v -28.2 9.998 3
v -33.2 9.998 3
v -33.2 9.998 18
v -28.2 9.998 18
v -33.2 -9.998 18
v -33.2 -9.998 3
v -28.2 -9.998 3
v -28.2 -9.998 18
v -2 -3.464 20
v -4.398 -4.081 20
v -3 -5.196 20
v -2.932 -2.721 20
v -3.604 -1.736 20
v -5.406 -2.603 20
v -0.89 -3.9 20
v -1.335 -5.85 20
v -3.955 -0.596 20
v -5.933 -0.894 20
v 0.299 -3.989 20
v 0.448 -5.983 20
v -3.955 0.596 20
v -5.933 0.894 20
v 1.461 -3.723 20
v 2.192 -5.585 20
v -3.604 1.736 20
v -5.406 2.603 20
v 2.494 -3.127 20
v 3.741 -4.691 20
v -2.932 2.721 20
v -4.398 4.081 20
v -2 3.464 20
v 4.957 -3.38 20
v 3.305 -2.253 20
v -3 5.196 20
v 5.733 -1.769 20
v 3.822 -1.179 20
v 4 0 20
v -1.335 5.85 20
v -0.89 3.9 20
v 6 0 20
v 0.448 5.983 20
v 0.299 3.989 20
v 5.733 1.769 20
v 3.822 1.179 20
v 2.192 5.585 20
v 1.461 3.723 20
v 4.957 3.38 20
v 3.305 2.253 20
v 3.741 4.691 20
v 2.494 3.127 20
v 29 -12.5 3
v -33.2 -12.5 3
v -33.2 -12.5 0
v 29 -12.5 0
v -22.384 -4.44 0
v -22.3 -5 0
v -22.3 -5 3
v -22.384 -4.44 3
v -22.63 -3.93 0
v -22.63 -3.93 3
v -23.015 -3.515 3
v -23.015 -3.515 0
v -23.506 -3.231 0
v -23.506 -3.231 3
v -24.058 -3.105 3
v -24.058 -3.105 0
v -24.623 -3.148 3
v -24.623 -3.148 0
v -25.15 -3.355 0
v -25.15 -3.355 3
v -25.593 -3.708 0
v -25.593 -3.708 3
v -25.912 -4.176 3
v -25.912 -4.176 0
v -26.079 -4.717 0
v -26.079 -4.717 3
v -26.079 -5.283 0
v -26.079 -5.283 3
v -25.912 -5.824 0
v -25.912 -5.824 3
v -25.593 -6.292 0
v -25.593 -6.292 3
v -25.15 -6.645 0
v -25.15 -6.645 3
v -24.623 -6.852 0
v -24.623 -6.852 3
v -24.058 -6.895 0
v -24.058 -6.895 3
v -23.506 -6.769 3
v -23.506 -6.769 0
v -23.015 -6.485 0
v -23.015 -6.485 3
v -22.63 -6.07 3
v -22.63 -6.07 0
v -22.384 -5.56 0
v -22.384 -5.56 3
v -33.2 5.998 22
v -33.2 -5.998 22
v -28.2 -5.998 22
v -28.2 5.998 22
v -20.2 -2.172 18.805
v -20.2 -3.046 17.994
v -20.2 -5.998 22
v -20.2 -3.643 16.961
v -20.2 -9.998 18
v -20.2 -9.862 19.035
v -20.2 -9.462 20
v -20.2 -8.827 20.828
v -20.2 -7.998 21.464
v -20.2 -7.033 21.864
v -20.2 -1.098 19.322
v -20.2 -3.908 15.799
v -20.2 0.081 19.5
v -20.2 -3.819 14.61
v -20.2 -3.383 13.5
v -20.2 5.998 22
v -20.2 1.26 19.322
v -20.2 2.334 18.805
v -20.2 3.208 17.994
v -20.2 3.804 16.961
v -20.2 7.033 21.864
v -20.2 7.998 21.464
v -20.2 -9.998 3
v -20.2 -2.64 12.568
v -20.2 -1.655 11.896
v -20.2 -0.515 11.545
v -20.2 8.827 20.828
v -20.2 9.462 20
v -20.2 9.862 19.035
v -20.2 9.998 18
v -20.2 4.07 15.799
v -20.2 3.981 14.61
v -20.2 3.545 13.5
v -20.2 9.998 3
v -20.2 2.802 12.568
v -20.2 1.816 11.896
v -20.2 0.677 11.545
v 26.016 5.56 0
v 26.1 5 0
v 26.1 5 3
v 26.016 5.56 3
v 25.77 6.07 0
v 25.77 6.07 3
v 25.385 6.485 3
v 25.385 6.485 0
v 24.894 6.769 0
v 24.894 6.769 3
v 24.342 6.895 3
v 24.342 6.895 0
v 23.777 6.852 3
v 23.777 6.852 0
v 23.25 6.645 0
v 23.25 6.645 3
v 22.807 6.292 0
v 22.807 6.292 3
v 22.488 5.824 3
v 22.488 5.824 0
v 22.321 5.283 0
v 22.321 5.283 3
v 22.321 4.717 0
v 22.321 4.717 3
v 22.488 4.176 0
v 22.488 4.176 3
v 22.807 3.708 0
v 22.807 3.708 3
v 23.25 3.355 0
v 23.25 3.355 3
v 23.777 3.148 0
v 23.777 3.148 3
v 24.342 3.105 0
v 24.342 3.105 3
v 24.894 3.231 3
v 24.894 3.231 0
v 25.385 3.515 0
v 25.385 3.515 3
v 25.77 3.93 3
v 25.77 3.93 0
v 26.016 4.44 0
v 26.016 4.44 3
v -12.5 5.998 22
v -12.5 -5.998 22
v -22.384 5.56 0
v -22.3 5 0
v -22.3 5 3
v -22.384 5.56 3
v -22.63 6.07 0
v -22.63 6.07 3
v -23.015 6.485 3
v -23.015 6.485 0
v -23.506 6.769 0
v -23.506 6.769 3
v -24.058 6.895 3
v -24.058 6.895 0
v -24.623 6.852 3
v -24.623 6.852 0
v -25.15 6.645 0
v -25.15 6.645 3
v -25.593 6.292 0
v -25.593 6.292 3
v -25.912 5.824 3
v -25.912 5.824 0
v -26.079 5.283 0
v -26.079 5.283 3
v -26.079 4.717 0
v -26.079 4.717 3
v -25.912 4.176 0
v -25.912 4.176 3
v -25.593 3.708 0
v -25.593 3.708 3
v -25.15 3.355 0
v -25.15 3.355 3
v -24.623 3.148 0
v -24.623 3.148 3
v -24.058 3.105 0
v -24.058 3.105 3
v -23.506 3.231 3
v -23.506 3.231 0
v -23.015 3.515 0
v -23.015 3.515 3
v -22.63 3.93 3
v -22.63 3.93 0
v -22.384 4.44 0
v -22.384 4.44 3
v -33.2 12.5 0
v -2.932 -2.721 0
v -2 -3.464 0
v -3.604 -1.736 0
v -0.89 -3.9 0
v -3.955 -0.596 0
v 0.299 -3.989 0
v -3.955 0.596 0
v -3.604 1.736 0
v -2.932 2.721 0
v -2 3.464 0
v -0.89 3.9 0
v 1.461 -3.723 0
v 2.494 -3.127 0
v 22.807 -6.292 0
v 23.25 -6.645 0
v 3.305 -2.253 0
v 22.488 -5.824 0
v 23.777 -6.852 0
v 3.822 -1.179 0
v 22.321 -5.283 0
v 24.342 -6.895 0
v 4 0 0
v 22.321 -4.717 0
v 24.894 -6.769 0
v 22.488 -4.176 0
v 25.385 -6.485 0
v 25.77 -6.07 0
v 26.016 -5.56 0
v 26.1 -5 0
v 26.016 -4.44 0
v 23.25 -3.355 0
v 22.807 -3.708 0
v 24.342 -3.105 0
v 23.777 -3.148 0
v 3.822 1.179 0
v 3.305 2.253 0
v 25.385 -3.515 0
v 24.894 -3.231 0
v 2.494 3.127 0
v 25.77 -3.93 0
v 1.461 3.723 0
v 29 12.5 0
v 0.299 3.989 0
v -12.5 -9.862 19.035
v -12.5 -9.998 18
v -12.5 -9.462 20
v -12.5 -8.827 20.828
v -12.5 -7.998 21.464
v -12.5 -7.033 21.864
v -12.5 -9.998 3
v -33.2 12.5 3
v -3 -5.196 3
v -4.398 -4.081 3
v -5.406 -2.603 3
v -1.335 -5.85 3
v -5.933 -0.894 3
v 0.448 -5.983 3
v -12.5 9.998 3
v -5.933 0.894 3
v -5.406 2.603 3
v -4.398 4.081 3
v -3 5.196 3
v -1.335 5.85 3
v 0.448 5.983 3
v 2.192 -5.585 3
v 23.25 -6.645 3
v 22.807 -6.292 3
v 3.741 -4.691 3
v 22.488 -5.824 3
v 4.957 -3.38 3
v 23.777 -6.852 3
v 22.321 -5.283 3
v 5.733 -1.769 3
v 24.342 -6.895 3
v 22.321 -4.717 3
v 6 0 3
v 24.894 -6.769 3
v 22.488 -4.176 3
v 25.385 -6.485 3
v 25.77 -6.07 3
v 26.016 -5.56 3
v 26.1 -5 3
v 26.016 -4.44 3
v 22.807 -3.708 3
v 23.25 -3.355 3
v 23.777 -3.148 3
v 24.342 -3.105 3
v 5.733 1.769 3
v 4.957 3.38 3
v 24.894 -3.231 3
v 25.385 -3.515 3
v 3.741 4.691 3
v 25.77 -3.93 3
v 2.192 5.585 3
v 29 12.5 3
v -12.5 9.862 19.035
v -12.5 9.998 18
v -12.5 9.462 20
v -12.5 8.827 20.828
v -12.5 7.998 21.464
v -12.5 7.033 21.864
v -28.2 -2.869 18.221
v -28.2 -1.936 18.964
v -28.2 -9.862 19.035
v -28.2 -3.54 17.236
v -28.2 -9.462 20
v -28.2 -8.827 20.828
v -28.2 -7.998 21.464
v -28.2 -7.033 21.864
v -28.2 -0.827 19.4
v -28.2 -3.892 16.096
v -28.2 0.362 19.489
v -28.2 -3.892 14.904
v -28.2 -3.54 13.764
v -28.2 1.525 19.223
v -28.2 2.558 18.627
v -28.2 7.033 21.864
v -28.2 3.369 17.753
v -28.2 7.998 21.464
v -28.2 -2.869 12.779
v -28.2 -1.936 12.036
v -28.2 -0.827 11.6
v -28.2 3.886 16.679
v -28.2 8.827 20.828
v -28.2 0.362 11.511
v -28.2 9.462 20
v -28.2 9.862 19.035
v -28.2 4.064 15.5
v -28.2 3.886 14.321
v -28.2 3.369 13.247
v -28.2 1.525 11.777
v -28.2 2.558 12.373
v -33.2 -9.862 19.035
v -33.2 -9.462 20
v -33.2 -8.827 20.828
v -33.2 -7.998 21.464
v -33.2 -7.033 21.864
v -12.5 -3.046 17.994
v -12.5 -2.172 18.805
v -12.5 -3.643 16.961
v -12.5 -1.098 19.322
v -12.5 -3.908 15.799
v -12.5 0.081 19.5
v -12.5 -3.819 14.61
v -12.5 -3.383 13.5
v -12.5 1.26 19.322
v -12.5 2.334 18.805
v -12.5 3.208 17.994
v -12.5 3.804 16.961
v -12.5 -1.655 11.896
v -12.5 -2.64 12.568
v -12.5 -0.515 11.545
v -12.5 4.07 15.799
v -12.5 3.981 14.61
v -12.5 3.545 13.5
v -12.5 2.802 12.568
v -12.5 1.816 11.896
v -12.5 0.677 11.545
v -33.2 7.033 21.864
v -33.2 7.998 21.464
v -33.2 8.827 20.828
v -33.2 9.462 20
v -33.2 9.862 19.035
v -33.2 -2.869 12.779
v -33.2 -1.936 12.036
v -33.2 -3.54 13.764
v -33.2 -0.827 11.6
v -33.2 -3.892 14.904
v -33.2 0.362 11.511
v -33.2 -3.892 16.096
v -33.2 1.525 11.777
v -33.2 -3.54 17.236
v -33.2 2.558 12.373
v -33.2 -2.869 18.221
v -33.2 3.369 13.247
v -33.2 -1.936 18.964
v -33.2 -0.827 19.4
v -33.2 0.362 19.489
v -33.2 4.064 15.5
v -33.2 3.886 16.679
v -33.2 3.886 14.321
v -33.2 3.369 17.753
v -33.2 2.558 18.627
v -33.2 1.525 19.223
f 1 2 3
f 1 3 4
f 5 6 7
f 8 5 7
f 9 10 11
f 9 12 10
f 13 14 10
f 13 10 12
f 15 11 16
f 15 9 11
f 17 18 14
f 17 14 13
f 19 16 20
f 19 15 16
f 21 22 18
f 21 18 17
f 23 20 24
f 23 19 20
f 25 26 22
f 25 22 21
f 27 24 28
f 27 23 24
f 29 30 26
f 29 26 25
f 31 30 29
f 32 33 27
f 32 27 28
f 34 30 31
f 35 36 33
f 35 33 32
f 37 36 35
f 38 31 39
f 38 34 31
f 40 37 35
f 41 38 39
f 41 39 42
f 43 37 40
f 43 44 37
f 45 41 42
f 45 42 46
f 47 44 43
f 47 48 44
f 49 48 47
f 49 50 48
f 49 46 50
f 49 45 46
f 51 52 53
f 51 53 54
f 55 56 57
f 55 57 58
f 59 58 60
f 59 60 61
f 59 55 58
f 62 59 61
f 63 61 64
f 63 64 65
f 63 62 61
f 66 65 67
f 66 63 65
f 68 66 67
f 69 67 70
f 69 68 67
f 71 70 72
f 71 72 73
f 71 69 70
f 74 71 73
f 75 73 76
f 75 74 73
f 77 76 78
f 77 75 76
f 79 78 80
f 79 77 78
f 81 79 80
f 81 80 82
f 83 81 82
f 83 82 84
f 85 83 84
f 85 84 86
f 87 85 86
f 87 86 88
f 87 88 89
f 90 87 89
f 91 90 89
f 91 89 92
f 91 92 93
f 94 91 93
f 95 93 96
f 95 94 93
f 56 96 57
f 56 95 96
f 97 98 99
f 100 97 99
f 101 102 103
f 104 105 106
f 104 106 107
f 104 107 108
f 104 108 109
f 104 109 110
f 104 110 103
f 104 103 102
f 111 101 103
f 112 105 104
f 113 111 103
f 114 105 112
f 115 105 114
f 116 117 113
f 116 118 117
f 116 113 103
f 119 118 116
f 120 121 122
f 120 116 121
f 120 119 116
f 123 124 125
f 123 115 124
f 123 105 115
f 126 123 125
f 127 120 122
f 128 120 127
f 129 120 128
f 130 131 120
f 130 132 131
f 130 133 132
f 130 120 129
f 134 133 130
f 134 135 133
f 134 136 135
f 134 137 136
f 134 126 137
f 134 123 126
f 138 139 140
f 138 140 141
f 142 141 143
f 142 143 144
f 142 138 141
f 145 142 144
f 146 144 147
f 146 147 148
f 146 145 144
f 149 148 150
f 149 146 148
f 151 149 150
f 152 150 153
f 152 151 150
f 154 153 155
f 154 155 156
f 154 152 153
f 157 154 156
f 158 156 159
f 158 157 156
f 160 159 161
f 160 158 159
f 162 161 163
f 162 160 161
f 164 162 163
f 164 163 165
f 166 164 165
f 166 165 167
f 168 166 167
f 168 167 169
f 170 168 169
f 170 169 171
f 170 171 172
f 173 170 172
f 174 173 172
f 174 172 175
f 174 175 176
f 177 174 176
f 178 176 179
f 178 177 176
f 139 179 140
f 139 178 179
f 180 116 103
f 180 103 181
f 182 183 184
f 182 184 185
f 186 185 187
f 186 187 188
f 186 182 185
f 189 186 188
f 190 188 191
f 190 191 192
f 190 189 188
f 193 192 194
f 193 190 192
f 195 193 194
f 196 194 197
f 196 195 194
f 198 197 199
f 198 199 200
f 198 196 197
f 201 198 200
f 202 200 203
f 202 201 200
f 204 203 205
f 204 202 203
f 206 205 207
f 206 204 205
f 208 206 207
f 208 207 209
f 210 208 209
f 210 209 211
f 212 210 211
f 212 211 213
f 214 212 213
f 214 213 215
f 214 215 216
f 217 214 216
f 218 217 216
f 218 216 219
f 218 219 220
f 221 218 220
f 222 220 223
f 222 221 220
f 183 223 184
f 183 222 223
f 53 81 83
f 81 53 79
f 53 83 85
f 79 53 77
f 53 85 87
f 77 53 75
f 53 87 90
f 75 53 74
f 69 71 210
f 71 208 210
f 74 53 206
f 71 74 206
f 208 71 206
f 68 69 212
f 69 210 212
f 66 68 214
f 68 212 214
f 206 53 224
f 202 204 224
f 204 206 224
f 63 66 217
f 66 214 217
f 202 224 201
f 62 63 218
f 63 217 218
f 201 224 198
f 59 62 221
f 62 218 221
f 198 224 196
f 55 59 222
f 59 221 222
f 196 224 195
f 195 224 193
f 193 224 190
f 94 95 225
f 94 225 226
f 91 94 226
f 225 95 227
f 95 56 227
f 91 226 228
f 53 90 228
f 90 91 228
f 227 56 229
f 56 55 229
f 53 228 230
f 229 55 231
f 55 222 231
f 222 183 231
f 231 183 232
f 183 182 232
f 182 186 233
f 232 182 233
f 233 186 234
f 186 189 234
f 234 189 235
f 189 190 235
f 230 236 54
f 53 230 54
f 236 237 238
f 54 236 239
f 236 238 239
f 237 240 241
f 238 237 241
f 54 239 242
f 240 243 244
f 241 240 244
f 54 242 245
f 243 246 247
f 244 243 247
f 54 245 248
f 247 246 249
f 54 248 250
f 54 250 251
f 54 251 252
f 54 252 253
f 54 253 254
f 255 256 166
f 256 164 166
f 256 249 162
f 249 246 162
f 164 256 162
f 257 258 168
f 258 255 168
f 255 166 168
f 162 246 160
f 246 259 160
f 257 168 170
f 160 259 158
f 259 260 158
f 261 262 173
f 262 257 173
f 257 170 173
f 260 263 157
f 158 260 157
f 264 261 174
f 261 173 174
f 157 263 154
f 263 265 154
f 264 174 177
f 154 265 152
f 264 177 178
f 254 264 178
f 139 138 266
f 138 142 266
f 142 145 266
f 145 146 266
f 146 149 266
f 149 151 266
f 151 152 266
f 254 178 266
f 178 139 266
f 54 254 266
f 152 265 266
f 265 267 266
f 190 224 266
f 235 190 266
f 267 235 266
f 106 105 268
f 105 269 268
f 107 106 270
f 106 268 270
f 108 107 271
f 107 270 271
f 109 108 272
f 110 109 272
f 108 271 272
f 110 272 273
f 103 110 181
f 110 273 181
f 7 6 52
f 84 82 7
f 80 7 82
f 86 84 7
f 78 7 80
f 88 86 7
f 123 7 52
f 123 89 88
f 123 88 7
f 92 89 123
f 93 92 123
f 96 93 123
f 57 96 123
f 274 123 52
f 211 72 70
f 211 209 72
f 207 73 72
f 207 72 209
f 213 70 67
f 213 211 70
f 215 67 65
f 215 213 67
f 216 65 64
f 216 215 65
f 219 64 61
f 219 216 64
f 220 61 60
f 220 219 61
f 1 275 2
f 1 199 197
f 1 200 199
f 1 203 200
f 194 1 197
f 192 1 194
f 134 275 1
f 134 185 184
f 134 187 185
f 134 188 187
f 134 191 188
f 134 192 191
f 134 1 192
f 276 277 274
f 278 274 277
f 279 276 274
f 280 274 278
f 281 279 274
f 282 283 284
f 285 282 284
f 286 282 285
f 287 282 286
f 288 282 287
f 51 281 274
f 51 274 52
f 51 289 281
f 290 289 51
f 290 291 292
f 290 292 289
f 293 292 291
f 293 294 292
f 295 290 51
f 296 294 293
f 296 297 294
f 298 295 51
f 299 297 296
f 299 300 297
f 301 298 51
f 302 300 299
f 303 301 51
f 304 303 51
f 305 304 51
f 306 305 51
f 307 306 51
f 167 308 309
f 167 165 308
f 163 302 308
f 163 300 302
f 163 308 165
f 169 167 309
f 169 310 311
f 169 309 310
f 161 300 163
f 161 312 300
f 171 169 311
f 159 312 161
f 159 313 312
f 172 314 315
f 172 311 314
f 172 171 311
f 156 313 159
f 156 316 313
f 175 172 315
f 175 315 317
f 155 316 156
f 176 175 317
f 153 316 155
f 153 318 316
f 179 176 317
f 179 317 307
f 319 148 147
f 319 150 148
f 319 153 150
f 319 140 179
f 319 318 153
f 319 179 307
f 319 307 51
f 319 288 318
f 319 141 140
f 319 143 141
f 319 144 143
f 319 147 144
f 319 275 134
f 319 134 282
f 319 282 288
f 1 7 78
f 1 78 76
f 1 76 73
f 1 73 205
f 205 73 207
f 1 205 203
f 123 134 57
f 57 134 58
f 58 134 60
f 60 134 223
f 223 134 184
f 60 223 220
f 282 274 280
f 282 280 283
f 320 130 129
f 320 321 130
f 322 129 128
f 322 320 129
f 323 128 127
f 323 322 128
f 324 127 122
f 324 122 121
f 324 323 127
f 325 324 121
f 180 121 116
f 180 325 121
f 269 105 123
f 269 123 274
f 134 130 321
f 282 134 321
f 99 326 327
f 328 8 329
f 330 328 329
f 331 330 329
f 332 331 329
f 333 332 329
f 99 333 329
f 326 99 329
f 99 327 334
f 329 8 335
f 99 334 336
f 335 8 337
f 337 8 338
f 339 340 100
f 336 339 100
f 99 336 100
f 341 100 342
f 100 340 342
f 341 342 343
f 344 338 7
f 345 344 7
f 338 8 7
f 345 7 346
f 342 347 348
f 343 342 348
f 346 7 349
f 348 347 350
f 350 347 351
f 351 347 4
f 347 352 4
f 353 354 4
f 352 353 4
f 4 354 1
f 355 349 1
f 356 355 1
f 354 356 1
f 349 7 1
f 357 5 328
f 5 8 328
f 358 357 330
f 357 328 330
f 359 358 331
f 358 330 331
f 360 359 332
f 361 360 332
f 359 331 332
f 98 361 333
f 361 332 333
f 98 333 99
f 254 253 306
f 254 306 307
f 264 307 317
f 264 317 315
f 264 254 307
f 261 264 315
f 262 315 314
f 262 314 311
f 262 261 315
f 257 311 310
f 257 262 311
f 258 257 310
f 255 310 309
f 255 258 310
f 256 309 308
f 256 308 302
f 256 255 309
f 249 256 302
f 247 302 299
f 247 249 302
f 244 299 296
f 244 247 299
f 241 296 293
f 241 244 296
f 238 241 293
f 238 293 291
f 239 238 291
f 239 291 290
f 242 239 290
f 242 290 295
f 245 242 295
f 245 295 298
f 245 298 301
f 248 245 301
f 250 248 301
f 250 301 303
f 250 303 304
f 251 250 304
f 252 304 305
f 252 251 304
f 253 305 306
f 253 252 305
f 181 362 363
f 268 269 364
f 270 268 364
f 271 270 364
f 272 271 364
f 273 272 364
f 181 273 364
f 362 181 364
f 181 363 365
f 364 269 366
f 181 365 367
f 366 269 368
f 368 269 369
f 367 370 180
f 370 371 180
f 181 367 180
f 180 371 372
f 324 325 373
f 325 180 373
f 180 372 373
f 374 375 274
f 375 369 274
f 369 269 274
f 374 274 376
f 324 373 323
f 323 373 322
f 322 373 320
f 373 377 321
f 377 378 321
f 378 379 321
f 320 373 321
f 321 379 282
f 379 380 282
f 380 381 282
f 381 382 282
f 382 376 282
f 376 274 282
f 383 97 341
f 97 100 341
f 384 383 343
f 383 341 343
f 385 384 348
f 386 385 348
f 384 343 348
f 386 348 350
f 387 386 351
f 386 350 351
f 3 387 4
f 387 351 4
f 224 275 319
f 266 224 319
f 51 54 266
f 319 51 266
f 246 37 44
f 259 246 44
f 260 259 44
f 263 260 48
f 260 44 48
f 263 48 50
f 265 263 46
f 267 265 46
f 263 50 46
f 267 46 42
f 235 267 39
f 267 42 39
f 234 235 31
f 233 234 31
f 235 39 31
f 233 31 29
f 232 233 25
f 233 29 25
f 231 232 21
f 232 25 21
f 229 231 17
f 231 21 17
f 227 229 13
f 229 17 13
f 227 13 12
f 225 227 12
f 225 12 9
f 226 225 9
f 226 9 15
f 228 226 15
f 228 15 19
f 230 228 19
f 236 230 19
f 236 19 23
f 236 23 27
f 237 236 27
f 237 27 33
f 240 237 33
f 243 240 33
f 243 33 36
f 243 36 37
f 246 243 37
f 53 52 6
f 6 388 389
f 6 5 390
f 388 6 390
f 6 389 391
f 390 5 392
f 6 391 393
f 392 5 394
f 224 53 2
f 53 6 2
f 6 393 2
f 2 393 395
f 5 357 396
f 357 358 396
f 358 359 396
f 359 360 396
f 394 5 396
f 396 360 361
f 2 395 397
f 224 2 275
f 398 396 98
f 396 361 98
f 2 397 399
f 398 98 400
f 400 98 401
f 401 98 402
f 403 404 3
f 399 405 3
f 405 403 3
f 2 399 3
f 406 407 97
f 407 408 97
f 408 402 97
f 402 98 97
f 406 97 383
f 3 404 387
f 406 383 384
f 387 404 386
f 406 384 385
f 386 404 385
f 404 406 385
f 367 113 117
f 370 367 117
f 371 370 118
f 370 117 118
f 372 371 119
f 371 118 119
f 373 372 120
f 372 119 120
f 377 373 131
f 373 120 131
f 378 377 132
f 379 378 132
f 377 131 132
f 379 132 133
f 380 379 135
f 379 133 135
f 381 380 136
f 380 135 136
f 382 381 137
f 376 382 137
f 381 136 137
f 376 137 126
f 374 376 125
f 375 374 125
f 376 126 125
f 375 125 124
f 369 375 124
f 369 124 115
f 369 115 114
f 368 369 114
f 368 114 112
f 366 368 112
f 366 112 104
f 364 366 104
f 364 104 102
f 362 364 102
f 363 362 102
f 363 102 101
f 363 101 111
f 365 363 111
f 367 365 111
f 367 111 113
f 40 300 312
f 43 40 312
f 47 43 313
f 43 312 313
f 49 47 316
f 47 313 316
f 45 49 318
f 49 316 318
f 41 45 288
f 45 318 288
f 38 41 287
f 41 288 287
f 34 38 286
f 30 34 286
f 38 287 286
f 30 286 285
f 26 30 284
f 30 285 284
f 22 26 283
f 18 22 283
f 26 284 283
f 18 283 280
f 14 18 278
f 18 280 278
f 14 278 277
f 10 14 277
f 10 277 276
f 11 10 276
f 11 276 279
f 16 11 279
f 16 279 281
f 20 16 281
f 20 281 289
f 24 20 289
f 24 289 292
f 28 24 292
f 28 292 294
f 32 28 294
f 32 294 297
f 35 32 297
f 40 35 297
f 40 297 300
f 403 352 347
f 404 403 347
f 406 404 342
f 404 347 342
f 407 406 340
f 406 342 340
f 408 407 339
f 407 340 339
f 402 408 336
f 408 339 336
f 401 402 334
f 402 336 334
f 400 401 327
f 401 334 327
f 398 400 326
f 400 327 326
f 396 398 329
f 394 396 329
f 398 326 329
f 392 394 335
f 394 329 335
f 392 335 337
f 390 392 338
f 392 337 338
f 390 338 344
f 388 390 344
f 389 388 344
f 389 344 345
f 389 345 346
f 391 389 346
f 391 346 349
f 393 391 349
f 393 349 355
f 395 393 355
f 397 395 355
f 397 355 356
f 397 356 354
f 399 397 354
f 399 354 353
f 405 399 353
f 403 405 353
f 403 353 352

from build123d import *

# Parameters (mm, degrees)
SKETCH1_W           = 58
SKETCH1_H           = 25
SKETCH1_R           = 1.9
BOSS_EXTRUDE1_DEPTH = 3
SKETCH2_R           = 6
BOSS_EXTRUDE2_DEPTH = 20
SKETCH3_R           = 4
CUT_EXTRUDE1_DEPTH  = 38.379807383
SKETCH4_W           = 7.7
SKETCH4_H           = 19.996282454
BOSS_EXTRUDE3_DEPTH = 19
CUT_EXTRUDE2_REACH  = 57.325
SKETCH5_R           = 4
FILLET1_R           = 4
SKETCH7_W           = 4.2
SKETCH7_H           = 25
BOSS_EXTRUDE4_DEPTH = 3
SKETCH8_W           = 5
SKETCH8_H           = 19.996282454
BOSS_EXTRUDE5_DEPTH = 19
CUT_EXTRUDE3_REACH  = 64.547
SKETCH9_R           = 4
FILLET2_R           = 4


with BuildPart() as part:
    # Sketch1 → Boss-Extrude1 (new body)
    with BuildSketch(Plane.XY):
        Rectangle(SKETCH1_W, SKETCH1_H)
        with Locations((24.2, 5)):
            Circle(SKETCH1_R, mode=Mode.SUBTRACT)
        with Locations((24.2, -5)):
            Circle(SKETCH1_R, mode=Mode.SUBTRACT)
        with Locations((-24.2, 5)):
            Circle(SKETCH1_R, mode=Mode.SUBTRACT)
        with Locations((-24.2, -5)):
            Circle(SKETCH1_R, mode=Mode.SUBTRACT)
    extrude(amount=BOSS_EXTRUDE1_DEPTH)

    # Sketch2 → Boss-Extrude2 (add)
    with BuildSketch(Plane.XY):
        Circle(SKETCH2_R)
    extrude(amount=BOSS_EXTRUDE2_DEPTH)

    # Sketch3 → Cut-Extrude1 (cut, through all)
    with BuildSketch(Plane.XY.offset(20)):
        Circle(SKETCH3_R)
    extrude(amount=-CUT_EXTRUDE1_DEPTH, mode=Mode.SUBTRACT)

    # Sketch4 → Boss-Extrude3 (add)
    with BuildSketch(Plane.XY.offset(3)):
        with Locations((-16.35, 0)):
            Rectangle(SKETCH4_W, SKETCH4_H)
    extrude(amount=BOSS_EXTRUDE3_DEPTH)

    # Sketch5 → Cut-Extrude2 (cut, up to next)
    with BuildSketch(Plane.ZY.offset(20.2), mode=Mode.PRIVATE) as cut_extrude2_sk1:
        with Locations((15.5, 0.080826905)):
            Circle(SKETCH5_R)
    cut_extrude2_tool1 = extrude(cut_extrude2_sk1.sketch, amount=-CUT_EXTRUDE2_REACH, mode=Mode.PRIVATE) & part.part
    add(cut_extrude2_tool1.solids().sort_by_distance((-20.2, 0.080827, 15.5))[0], mode=Mode.SUBTRACT)

    # Fillet1
    fillet1_edges = [part.edges().sort_by_distance(p)[0] for p in [
        (-16.35, 9.998141227, 22),
        (-16.35, -9.998141227, 22),
    ]]
    fillet(fillet1_edges, radius=FILLET1_R)

    # Sketch7 → Boss-Extrude4 (add)
    with BuildSketch(Plane.XY.offset(3)):
        with Locations((-31.1, 0)):
            Rectangle(SKETCH7_W, SKETCH7_H)
    extrude(amount=-BOSS_EXTRUDE4_DEPTH)

    # Sketch8 → Boss-Extrude5 (add)
    with BuildSketch(Plane.XY.offset(3)):
        with Locations((-30.7, 0)):
            Rectangle(SKETCH8_W, SKETCH8_H)
    extrude(amount=BOSS_EXTRUDE5_DEPTH)

    # Sketch9 → Cut-Extrude3 (cut, up to next)
    with BuildSketch(Plane(origin=(-28.2, 0, 0), x_dir=(0, 0, -1), z_dir=(1, 0, 0)), mode=Mode.PRIVATE) as cut_extrude3_sk1:
        with Locations(Location((-15.5, 0.063578072, 0), (0, 0, 90))):
            Circle(SKETCH9_R)
    cut_extrude3_tool1 = extrude(cut_extrude3_sk1.sketch, amount=-CUT_EXTRUDE3_REACH, mode=Mode.PRIVATE) & part.part
    add(cut_extrude3_tool1.solids().sort_by_distance((-28.2, 0.063578, 15.5))[0], mode=Mode.SUBTRACT)

    # Fillet2
    fillet2_edges = [part.edges().sort_by_distance(p)[0] for p in [
        (-30.7, 9.998141227, 22),
        (-30.7, -9.998141227, 22),
    ]]
    fillet(fillet2_edges, radius=FILLET2_R)


solid = part.part
